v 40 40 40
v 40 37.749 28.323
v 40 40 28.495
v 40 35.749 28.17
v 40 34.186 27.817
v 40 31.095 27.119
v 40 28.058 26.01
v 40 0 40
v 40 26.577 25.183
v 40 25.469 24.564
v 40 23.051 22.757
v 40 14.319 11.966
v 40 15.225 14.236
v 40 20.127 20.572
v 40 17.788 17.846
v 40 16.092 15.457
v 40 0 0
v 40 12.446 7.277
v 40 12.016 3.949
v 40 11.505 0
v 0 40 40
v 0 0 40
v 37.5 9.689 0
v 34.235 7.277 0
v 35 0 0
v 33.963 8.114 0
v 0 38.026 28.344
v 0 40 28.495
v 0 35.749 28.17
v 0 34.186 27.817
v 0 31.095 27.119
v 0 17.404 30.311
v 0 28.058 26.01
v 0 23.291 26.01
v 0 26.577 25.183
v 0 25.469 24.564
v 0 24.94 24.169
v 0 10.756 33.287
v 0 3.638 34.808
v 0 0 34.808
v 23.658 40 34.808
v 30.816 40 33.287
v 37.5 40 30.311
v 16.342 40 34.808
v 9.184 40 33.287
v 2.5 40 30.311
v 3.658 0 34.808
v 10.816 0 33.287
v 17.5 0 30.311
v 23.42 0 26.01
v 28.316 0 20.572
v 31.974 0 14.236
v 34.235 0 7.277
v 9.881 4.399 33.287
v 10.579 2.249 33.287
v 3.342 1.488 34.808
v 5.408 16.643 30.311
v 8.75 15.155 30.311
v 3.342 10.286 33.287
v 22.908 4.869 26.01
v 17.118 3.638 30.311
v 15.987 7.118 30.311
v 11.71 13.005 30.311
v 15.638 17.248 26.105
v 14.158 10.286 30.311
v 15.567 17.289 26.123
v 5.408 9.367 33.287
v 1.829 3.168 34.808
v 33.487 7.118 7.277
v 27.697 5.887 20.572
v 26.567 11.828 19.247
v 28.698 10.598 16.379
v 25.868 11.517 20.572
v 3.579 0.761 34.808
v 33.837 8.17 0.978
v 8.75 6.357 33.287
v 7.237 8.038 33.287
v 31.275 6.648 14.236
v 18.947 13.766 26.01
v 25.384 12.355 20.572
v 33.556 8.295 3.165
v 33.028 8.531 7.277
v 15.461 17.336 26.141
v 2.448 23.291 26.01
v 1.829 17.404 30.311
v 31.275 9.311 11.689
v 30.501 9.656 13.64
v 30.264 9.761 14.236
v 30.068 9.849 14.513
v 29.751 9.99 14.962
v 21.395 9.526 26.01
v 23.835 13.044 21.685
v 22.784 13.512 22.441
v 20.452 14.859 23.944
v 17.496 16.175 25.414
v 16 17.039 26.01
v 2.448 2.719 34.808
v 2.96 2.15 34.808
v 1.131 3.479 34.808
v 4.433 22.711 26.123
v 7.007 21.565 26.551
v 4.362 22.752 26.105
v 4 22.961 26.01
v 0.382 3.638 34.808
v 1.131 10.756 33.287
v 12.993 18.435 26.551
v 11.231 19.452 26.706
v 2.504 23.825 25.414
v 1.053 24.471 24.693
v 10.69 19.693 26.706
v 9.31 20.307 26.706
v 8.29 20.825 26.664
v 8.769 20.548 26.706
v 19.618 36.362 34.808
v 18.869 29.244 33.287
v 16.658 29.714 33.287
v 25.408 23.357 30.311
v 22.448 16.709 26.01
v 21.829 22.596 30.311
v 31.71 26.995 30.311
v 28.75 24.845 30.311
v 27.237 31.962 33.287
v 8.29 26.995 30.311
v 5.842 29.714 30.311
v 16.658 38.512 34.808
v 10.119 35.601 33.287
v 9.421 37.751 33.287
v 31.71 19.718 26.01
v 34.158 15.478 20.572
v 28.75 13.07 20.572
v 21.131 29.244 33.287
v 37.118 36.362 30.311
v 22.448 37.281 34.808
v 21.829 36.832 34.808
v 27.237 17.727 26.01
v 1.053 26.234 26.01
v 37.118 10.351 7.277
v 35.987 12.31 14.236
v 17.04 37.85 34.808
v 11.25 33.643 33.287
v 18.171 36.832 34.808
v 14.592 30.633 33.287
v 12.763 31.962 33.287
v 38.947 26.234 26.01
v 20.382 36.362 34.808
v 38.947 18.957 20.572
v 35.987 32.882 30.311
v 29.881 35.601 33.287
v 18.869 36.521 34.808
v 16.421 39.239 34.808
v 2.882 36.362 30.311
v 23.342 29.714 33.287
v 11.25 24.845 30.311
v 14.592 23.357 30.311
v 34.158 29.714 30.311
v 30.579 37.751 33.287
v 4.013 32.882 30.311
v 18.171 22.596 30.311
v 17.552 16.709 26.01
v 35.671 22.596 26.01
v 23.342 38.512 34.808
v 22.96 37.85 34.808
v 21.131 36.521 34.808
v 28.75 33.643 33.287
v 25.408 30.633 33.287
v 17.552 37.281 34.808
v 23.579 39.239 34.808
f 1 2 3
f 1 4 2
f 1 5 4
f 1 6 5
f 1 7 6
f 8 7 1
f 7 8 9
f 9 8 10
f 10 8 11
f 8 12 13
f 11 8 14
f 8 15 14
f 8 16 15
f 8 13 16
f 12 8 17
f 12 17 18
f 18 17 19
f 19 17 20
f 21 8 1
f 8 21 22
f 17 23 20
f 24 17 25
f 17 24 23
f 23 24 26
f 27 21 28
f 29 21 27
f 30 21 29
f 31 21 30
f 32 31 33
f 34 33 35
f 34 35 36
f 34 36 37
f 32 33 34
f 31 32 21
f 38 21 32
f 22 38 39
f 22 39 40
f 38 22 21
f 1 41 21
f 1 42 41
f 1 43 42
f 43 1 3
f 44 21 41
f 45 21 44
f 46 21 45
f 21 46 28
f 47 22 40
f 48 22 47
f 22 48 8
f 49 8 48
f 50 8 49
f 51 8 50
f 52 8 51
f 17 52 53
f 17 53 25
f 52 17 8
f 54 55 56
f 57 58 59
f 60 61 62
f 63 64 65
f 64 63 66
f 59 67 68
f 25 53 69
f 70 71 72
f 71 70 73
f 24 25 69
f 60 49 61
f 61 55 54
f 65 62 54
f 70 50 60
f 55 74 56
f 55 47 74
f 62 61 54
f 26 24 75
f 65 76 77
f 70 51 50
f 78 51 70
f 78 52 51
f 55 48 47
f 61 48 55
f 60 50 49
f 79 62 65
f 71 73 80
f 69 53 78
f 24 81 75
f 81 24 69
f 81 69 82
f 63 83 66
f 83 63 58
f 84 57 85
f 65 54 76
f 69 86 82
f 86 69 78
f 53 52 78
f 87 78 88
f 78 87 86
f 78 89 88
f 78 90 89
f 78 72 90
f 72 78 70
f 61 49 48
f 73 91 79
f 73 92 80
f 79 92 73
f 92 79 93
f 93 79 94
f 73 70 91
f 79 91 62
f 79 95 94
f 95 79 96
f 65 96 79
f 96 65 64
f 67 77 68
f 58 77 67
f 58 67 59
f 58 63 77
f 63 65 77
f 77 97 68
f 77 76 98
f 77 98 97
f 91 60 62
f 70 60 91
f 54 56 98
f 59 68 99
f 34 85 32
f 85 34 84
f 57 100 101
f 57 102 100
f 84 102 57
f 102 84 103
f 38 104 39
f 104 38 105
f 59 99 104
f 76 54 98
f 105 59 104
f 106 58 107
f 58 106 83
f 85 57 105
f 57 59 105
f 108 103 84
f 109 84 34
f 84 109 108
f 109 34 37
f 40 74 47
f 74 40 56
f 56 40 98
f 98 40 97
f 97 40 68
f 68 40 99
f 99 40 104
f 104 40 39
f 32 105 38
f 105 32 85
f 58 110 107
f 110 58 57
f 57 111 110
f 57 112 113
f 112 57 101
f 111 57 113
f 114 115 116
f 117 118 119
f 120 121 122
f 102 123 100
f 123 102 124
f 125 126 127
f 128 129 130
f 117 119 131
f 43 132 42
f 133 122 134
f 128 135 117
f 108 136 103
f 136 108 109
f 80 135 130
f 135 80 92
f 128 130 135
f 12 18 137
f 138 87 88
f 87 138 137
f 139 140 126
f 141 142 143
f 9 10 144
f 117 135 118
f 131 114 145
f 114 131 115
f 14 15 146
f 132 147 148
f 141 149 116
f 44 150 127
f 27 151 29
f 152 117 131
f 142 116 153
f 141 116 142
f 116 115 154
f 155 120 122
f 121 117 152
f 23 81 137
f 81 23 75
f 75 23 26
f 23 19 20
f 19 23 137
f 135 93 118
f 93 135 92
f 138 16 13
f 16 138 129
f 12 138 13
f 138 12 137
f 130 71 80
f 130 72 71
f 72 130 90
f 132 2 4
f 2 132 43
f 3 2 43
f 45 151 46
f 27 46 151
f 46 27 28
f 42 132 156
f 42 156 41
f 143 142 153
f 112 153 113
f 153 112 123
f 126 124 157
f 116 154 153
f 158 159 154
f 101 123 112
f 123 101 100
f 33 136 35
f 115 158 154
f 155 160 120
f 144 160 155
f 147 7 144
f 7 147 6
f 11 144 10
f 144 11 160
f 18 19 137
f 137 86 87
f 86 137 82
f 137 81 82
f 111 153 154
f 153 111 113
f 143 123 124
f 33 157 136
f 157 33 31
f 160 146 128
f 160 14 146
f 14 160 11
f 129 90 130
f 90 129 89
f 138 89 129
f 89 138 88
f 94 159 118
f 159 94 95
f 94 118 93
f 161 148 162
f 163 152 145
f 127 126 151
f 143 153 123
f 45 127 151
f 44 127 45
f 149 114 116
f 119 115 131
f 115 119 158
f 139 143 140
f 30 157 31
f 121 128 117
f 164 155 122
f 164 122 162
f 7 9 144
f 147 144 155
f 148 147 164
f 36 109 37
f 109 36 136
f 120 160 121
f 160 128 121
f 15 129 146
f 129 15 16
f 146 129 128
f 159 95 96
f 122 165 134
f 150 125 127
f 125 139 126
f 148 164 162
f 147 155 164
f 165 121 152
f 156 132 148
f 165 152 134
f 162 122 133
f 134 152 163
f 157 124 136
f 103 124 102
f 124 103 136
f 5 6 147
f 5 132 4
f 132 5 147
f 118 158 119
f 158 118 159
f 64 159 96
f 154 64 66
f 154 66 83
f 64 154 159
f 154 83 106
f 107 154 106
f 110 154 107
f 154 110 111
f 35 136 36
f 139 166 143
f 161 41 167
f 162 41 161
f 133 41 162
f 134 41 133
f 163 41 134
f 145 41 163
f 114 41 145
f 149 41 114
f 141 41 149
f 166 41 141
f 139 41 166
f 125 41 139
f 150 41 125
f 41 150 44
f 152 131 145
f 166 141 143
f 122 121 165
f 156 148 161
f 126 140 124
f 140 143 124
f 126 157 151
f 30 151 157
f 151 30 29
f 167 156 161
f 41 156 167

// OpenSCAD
module gazebo() {
    difference() {
        cube([40,40,40]);
        sphere(r=35);
        translate([20,40,0]) {
            sphere(r=35);
        }
    }
}

gazebo();
